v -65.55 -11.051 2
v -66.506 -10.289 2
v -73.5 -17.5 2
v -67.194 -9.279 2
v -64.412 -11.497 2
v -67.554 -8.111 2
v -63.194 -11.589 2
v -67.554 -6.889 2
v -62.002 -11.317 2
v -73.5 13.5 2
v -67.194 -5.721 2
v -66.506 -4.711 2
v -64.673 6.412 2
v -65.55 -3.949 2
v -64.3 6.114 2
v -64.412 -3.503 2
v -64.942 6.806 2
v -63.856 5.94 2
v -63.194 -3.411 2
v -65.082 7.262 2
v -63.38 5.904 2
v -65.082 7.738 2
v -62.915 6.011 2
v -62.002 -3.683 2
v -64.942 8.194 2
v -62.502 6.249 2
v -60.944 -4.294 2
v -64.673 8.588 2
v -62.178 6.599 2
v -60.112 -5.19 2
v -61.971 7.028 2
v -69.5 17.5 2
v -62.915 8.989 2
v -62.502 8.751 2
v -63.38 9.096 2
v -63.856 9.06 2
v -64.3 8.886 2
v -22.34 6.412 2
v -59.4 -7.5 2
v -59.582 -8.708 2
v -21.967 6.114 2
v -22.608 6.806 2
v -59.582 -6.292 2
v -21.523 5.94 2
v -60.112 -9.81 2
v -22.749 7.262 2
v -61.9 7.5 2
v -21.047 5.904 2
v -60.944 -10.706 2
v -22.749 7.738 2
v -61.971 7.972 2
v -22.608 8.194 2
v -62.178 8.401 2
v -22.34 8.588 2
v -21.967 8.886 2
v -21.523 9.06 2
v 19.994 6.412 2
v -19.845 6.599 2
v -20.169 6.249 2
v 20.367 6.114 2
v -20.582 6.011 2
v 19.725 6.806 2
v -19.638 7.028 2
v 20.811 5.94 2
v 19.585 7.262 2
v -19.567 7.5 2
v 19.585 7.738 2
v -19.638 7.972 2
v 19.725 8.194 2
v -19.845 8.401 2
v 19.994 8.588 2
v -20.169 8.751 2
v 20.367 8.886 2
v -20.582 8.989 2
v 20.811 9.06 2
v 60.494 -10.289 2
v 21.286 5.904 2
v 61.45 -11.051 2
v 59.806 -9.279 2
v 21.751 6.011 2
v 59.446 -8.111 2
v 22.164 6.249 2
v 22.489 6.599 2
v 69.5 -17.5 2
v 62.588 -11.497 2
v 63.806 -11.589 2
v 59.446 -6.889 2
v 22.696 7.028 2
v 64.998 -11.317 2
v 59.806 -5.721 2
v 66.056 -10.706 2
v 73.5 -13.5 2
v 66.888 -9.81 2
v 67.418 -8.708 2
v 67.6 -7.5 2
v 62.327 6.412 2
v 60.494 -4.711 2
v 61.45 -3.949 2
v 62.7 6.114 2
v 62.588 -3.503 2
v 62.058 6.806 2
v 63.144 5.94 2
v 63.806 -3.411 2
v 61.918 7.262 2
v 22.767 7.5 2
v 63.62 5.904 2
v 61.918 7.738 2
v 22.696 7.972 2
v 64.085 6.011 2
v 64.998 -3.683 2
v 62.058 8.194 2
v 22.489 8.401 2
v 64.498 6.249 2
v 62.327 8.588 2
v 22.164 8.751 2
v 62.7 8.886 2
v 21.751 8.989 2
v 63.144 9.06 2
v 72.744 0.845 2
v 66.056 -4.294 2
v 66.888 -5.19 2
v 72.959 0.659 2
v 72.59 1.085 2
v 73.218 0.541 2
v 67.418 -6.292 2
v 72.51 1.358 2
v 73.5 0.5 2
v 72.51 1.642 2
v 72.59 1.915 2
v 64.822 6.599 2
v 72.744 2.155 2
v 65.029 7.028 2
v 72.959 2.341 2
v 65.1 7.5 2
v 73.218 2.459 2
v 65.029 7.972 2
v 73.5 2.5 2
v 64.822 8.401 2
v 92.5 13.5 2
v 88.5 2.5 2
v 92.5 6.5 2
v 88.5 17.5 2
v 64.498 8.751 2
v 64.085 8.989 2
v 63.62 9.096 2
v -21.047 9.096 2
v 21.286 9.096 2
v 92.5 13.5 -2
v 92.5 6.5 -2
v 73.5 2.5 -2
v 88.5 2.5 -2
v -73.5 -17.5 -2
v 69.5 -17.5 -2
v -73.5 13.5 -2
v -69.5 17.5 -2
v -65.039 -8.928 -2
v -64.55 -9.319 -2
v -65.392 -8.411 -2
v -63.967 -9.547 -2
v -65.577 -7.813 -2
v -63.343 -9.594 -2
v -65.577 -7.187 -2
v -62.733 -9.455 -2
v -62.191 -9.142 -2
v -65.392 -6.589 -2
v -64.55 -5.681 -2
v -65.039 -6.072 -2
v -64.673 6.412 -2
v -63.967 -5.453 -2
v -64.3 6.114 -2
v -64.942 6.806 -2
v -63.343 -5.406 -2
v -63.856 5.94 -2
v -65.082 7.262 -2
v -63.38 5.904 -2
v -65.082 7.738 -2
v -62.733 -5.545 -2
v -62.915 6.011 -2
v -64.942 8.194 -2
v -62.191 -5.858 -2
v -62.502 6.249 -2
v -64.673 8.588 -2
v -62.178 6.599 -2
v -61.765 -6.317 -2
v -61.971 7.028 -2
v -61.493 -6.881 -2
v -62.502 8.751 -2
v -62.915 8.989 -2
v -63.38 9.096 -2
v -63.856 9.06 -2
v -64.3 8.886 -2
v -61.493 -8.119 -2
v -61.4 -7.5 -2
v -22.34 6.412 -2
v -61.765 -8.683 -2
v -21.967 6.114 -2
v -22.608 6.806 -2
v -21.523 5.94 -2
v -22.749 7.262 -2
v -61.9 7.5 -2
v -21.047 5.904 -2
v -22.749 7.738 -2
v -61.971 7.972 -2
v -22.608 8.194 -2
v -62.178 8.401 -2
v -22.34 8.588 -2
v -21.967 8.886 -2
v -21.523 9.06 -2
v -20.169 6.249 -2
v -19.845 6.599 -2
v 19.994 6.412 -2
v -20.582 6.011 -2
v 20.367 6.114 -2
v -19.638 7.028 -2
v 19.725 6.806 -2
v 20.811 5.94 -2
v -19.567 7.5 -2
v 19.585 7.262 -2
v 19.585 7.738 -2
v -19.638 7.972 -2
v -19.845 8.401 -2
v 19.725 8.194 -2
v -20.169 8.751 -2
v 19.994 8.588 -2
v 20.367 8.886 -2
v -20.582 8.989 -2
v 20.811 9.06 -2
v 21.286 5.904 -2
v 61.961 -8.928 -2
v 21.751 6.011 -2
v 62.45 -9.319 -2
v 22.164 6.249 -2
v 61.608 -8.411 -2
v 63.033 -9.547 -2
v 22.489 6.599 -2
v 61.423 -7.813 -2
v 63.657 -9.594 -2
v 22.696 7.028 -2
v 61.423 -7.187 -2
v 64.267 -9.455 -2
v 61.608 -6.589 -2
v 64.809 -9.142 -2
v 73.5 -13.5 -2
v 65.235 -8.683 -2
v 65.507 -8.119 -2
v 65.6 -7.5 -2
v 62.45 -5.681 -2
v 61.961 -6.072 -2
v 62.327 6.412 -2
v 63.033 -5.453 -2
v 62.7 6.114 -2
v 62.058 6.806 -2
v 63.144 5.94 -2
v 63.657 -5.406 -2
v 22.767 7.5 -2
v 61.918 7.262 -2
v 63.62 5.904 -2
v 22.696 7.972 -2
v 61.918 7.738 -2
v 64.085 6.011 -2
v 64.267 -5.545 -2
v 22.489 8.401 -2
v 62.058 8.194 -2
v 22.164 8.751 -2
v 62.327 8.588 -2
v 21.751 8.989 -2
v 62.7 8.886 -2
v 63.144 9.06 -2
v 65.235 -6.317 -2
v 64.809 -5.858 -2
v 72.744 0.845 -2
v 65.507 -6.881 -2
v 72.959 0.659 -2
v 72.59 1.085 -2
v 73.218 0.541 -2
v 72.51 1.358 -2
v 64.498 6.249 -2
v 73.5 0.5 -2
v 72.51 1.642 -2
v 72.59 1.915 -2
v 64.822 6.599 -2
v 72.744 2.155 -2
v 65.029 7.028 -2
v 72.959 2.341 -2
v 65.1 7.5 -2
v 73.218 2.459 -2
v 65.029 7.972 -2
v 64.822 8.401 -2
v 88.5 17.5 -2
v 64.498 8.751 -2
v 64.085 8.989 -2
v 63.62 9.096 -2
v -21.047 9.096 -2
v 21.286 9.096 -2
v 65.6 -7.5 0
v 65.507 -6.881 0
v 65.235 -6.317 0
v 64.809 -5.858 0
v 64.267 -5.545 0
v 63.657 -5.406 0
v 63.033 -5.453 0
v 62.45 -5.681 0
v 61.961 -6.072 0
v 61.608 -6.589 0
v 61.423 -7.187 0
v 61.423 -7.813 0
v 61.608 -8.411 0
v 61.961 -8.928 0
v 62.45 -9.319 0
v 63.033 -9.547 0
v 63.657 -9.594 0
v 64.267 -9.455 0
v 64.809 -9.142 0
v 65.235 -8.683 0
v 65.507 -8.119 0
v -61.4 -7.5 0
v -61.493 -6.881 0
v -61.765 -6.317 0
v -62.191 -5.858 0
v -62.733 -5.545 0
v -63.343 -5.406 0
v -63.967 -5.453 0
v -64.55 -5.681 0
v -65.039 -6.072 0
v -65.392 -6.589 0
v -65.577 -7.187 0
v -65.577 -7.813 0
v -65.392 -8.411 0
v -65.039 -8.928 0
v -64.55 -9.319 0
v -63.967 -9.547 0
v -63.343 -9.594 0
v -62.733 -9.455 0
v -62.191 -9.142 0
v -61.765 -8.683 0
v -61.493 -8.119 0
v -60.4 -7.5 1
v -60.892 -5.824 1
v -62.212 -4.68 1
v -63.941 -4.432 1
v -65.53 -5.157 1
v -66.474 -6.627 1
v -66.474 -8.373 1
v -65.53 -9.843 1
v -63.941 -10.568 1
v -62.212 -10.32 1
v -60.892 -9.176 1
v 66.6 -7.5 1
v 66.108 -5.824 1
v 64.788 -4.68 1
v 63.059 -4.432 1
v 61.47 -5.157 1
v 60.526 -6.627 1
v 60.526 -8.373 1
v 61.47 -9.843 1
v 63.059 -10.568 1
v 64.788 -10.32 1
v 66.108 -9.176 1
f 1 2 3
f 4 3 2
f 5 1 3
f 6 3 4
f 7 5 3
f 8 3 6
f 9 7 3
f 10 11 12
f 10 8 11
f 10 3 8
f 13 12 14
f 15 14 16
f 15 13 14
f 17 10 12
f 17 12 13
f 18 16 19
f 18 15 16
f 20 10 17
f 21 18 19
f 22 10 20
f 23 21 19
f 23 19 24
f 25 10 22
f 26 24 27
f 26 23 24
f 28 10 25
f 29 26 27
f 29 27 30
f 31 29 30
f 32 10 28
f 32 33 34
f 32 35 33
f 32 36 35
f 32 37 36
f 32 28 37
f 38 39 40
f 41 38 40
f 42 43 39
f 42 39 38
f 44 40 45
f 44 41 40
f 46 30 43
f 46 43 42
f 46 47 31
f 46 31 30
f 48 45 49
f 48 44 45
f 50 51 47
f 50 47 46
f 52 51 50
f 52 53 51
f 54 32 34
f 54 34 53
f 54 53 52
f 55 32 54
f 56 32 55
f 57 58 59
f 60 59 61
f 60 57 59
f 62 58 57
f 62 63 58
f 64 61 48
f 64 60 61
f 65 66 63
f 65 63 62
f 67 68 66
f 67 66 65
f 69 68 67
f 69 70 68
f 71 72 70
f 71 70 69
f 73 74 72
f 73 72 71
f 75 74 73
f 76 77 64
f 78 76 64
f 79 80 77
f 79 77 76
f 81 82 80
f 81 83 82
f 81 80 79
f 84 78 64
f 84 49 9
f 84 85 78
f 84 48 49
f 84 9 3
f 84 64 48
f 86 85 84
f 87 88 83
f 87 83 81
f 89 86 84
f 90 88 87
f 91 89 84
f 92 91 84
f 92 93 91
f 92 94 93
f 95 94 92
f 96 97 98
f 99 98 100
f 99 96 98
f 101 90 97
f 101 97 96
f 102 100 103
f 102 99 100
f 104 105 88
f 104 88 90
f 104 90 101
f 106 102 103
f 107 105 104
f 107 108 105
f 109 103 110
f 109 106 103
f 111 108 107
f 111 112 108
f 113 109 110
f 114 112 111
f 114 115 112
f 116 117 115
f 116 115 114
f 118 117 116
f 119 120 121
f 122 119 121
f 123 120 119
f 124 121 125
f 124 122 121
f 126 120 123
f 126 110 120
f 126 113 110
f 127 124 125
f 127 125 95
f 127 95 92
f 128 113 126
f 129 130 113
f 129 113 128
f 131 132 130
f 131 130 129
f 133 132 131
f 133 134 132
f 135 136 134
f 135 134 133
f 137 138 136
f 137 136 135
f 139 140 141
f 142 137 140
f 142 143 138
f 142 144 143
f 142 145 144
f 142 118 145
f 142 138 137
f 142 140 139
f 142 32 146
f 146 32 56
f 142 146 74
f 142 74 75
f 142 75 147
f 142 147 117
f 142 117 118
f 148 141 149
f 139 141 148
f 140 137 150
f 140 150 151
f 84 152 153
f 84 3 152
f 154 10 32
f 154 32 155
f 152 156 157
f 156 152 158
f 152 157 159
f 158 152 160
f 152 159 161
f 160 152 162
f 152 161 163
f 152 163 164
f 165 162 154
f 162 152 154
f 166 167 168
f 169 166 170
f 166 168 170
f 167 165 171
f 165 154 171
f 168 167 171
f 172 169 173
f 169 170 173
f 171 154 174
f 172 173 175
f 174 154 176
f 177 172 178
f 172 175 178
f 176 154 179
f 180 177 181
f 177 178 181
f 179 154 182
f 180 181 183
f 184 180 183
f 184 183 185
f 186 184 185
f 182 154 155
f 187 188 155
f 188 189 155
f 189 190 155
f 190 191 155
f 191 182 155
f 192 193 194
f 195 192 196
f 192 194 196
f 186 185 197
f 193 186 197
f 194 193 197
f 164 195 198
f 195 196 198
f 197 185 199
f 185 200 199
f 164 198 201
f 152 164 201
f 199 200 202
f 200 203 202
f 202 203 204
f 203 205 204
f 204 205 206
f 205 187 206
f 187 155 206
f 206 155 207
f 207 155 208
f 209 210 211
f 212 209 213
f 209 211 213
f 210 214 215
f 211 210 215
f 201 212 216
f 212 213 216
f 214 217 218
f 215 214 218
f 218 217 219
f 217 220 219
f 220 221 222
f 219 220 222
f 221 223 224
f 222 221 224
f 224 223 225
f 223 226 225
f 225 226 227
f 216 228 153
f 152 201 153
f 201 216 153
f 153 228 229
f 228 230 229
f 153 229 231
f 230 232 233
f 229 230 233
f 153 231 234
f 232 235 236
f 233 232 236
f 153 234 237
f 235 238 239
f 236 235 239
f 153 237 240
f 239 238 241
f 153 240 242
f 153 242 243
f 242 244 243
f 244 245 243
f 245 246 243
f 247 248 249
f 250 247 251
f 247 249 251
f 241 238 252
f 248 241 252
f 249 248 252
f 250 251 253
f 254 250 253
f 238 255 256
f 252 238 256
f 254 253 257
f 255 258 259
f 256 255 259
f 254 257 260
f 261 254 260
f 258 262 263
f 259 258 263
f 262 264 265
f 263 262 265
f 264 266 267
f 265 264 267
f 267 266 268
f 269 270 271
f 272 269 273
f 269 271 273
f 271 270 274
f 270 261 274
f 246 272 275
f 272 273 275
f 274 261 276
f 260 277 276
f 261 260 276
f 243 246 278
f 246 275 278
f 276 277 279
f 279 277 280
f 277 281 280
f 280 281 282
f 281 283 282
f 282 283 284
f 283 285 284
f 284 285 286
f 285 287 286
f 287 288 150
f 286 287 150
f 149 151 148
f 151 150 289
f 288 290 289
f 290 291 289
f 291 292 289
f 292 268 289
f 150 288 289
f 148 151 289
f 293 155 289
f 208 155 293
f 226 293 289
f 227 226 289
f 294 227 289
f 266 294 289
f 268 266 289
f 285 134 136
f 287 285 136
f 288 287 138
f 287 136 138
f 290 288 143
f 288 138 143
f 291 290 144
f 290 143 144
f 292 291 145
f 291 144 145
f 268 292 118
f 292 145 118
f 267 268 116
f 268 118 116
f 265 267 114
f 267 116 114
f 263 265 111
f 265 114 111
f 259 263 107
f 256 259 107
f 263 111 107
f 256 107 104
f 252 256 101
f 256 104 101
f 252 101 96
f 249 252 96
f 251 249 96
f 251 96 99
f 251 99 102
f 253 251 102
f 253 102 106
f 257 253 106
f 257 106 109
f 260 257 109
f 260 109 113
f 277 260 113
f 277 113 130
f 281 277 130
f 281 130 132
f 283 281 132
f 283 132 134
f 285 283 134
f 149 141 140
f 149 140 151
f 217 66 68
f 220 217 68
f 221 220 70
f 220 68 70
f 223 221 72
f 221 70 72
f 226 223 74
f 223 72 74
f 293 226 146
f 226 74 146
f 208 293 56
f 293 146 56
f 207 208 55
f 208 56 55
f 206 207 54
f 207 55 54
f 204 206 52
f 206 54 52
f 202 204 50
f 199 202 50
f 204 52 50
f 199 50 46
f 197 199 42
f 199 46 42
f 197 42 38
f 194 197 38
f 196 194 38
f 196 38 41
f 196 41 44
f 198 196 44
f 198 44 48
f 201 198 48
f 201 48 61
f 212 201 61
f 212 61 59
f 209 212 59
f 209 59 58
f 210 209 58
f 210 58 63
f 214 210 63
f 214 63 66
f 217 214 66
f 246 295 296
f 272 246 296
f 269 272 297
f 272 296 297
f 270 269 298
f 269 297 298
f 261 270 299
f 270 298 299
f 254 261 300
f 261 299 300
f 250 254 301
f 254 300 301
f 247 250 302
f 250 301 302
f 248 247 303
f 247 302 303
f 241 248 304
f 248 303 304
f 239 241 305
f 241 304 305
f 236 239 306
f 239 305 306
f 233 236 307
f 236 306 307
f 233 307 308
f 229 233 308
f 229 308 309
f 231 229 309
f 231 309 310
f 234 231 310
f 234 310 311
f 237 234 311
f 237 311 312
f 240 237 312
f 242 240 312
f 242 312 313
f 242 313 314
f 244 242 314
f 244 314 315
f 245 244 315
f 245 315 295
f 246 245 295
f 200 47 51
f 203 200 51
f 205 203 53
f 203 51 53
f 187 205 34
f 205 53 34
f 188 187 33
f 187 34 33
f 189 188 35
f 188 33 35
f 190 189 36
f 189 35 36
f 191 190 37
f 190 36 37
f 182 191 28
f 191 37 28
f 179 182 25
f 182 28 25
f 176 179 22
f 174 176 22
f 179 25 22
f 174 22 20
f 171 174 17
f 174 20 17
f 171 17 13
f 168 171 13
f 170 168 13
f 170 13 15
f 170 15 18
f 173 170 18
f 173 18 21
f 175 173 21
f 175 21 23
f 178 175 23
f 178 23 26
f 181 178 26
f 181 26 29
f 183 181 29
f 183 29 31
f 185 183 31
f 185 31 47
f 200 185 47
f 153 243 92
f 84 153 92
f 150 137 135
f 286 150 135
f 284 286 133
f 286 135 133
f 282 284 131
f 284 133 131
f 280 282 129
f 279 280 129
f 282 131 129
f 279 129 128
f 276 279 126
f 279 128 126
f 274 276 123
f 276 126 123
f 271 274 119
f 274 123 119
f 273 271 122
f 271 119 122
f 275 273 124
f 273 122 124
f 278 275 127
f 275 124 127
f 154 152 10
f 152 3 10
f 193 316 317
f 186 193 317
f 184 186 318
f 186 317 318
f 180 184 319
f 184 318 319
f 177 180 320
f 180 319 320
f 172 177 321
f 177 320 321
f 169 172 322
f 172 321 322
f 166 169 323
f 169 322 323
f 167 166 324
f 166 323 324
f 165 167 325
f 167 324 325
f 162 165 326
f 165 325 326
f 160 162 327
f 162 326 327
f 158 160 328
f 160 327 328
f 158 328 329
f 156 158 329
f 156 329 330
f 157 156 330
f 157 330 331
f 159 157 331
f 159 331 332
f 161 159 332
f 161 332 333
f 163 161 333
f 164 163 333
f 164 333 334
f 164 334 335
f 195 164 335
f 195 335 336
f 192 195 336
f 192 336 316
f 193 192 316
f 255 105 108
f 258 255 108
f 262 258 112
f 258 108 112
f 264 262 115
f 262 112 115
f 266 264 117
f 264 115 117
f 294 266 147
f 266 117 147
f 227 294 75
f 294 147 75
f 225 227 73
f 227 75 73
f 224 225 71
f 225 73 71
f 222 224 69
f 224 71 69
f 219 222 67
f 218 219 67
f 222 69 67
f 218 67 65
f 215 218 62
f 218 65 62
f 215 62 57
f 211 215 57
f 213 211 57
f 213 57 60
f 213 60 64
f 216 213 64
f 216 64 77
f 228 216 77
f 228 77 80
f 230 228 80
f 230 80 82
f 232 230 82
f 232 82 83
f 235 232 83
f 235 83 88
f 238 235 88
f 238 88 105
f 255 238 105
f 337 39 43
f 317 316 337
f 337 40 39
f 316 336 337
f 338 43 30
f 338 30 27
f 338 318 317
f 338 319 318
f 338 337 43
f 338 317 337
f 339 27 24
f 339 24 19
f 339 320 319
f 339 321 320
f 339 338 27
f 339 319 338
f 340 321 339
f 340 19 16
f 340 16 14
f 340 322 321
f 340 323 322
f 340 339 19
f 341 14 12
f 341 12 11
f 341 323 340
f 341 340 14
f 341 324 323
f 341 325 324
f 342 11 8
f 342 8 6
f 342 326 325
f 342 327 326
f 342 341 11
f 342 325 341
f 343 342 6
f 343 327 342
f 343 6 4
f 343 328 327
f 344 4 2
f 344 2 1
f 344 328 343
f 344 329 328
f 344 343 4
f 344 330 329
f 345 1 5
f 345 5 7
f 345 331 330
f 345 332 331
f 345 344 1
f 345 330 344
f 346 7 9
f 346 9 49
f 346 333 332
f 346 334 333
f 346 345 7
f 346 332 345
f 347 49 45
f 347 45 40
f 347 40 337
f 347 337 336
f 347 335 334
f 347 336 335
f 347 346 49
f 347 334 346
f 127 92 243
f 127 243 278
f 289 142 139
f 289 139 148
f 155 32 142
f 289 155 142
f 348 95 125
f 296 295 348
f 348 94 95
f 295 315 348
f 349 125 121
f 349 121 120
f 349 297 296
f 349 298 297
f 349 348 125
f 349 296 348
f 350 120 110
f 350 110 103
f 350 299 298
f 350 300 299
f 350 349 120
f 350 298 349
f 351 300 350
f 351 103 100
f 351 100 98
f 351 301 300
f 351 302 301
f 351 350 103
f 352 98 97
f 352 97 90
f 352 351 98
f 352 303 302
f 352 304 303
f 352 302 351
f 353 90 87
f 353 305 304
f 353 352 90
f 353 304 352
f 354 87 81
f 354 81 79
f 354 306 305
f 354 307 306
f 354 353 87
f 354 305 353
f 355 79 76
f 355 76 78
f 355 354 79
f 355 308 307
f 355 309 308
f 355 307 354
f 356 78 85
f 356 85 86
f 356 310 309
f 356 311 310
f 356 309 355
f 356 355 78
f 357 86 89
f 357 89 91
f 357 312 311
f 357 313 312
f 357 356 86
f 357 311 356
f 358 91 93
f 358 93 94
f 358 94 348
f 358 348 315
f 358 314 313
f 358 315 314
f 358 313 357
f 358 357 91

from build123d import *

# Parameters (mm, degrees)
SKETCH_1_W          = 147
SKETCH_1_H          = 35
EXTRUDE_1_DEPTH     = 2
SKETCH_2_W          = 19
SKETCH_2_H          = 15
EXTRUDE_2_DEPTH     = 4
SKETCH_3_R          = 2.1
CUT_EXTRUDE_1_DEPTH = 95.225792647
CHAMFER_1_SIZE      = 4
SKETCH_4_R          = 1
CUT_EXTRUDE_2_DEPTH = 95.225792647
SKETCH_5_R          = 1.6
CUT_EXTRUDE_3_DEPTH = 95.225792647
CHAMFER_2_SIZE      = 2


with BuildPart() as part:
    # 草图1 → 凸台-拉伸1 (new, symmetric)
    with BuildSketch(Plane.XY):
        Rectangle(SKETCH_1_W, SKETCH_1_H)
    extrude(amount=EXTRUDE_1_DEPTH, both=True)

    # 草图2 → 凸台-拉伸2 (add)
    with BuildSketch(Plane.XY.offset(2)):
        with Locations((83, 10)):
            Rectangle(SKETCH_2_W, SKETCH_2_H)
    extrude(amount=-EXTRUDE_2_DEPTH)

    # 草图3 → 切除-拉伸1 (cut, through all)
    with BuildSketch(Plane.XY.offset(2)):
        with Locations((-63.5, -7.5)):
            Circle(SKETCH_3_R)
        with Locations((63.5, -7.5)):
            Circle(SKETCH_3_R)
    extrude(amount=-CUT_EXTRUDE_1_DEPTH, mode=Mode.SUBTRACT)

    # 倒角1
    chamfer_1_edges = [part.edges().sort_by_distance(p)[0] for p in [
        (92.5, 17.5, 0),
        (92.5, 2.5, 0),
        (-73.5, 17.5, 0),
        (73.5, -17.5, 0),
    ]]
    chamfer(chamfer_1_edges, length=CHAMFER_1_SIZE)

    # 草图4 → 切除-拉伸2 (cut, through all)
    with BuildSketch(Plane.XY.offset(2)):
        with Locations((73.5, 1.5)):
            Circle(SKETCH_4_R)
    extrude(amount=-CUT_EXTRUDE_2_DEPTH, mode=Mode.SUBTRACT)

    # 草图5 → 切除-拉伸3 (cut, through all)
    with BuildSketch(Plane.XY.offset(2)):
        with Locations((-63.5, 7.5)):
            Circle(SKETCH_5_R)
        with Locations((-21.166666667, 7.5)):
            Circle(SKETCH_5_R)
        with Locations((21.166666667, 7.5)):
            Circle(SKETCH_5_R)
        with Locations((63.5, 7.5)):
            Circle(SKETCH_5_R)
    extrude(amount=-CUT_EXTRUDE_3_DEPTH, mode=Mode.SUBTRACT)

    # 倒角2
    chamfer_2_edges = [part.edges().sort_by_distance(p)[0] for p in [
        (-65.6, -7.5, 2),
        (61.4, -7.5, 2),
    ]]
    chamfer(chamfer_2_edges, length=CHAMFER_2_SIZE)


solid = part.part
